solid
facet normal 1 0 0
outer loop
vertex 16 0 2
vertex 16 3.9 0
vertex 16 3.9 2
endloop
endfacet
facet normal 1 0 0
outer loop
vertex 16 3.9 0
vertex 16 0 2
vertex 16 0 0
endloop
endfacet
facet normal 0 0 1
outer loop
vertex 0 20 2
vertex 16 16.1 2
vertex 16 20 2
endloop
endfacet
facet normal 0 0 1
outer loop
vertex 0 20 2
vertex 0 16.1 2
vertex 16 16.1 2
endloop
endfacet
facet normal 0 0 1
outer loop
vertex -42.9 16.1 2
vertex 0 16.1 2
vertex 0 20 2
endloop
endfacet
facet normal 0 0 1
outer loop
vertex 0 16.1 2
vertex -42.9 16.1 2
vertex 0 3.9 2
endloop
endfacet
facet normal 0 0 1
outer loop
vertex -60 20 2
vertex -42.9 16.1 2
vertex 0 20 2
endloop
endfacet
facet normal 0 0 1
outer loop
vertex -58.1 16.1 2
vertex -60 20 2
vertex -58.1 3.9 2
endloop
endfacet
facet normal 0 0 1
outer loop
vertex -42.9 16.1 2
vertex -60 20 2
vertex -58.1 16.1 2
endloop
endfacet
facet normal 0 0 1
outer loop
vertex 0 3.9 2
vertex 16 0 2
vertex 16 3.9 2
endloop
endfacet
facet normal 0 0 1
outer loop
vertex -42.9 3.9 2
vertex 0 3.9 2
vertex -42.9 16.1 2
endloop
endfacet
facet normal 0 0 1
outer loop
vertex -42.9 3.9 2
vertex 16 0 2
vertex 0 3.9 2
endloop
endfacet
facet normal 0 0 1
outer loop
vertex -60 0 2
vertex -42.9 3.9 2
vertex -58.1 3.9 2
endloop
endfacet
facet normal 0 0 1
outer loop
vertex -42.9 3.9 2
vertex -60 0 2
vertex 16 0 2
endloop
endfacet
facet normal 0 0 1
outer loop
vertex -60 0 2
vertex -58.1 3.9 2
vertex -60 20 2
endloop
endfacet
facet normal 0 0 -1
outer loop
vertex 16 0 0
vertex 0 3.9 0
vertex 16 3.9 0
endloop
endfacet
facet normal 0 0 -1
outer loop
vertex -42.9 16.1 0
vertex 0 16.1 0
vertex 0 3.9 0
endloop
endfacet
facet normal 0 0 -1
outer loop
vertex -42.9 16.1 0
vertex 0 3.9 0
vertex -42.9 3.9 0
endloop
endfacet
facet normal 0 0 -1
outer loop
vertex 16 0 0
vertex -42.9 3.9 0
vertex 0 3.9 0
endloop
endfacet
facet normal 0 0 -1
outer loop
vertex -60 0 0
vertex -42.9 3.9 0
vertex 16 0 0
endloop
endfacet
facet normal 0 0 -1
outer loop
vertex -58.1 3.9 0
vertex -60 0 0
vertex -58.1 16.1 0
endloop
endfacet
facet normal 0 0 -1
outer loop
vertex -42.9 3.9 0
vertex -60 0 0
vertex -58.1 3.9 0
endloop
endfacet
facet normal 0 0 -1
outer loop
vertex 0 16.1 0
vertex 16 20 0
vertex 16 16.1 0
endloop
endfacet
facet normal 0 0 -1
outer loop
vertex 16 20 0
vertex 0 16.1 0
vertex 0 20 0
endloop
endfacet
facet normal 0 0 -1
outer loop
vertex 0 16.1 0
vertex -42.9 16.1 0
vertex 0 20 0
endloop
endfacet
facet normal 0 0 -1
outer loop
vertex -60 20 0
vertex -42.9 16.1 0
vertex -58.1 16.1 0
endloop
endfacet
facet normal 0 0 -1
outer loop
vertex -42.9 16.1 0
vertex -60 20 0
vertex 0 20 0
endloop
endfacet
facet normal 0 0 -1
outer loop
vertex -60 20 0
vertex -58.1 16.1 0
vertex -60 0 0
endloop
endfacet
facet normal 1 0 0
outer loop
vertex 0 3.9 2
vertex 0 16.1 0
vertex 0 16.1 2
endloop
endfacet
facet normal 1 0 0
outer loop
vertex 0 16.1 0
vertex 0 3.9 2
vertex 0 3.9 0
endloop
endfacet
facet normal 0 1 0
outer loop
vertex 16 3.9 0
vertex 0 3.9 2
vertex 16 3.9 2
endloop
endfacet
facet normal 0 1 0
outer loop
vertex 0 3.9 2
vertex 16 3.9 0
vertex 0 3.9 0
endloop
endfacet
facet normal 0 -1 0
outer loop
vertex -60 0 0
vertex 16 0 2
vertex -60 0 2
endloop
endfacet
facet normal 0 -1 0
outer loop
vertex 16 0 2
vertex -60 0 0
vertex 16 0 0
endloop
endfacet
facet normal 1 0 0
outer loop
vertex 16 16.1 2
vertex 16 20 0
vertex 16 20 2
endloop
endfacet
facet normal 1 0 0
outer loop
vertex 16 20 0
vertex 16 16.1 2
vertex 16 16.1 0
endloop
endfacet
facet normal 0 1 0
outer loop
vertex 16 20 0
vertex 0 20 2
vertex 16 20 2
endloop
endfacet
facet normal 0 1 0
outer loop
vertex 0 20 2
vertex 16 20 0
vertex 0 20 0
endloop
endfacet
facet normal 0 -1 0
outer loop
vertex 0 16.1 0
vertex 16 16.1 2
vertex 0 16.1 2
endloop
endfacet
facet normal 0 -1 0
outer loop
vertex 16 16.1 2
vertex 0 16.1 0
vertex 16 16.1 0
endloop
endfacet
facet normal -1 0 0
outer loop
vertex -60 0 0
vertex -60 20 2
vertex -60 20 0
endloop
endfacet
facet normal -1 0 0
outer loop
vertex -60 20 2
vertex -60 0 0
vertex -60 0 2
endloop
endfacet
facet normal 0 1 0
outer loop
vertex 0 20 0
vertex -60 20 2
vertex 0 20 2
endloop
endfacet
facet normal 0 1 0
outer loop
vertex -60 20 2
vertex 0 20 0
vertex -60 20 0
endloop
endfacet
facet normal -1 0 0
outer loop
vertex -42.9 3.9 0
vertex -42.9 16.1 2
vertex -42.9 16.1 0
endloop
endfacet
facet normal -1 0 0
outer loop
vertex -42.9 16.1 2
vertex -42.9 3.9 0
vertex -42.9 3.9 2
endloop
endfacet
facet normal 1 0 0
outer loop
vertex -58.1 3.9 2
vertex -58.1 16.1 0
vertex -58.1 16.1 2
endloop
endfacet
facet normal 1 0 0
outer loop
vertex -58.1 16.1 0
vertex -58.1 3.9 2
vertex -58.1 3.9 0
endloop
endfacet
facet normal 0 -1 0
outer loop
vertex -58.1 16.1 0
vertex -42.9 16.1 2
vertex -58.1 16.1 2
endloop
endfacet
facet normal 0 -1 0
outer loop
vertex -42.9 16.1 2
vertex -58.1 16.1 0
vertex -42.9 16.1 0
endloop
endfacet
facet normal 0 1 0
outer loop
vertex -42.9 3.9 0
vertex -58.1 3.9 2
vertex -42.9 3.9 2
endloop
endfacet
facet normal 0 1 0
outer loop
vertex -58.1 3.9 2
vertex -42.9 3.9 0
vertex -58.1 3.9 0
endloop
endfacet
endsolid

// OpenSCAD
// file: clip.scad
function nutY() = 12;
function nutX() = 15;

module clip() {
  nutX = nutX();
  nutZ = 12;
  cube([nutX, nutY(), nutZ]);

  module corner(xyz) { 
    lip = 1.3;
    height = 8;
    x1 = xyz[0];
    y1 = 1;

    translate([0,0,xyz[2]]) {
      cube([x1, y1, height]); 
      translate([0, 0, height]) {
        cube([x1, y1+lip, 1]);
      }
    }

    x2 = 1;
    y2 = xyz[1];

    translate([xyz[0]-x2, 0, xyz[2]]) {
      cube([x2, y2, height]);
      translate([-lip,0,height]) {
        cube([x2+lip, y2, 1]);
      }
    }
  };

  module cubeWithCorner(xyz) {
    cube(xyz);
    corner(xyz);
  }

  ySup = 80;
  translate([0, -ySup/2 + nutY()/2, nutZ]){
    cubeWithCorner([15, ySup, 2]);
  }
}

clip();
// main file
use<./clip.scad>

clearance = 0.2;
function prongWidth() = 4;
function spanZ() = 2;
module span() {
  color("darkorchid")
  difference() {
    union(){
      prongLength = 16;
      prongSpacing = nutY()+.2;
      cube([prongLength, prongWidth()-clearance/2, spanZ()]);
      translate([0, prongSpacing+prongWidth()-clearance/2, 0]) cube([prongLength, prongWidth()-clearance/2, spanZ()]);
      straightLength = 2 + nutX() + 43 ;
      translate([-straightLength, 0, 0]) cube([straightLength, prongWidth()*2+prongSpacing-clearance, spanZ()]);
    };
    translate(-[nutX() + 43 + clearance/2, -prongWidth() + clearance/2, .5]) cube([nutX()+clearance, nutY()+clearance, 3]);
  }
}
span();
